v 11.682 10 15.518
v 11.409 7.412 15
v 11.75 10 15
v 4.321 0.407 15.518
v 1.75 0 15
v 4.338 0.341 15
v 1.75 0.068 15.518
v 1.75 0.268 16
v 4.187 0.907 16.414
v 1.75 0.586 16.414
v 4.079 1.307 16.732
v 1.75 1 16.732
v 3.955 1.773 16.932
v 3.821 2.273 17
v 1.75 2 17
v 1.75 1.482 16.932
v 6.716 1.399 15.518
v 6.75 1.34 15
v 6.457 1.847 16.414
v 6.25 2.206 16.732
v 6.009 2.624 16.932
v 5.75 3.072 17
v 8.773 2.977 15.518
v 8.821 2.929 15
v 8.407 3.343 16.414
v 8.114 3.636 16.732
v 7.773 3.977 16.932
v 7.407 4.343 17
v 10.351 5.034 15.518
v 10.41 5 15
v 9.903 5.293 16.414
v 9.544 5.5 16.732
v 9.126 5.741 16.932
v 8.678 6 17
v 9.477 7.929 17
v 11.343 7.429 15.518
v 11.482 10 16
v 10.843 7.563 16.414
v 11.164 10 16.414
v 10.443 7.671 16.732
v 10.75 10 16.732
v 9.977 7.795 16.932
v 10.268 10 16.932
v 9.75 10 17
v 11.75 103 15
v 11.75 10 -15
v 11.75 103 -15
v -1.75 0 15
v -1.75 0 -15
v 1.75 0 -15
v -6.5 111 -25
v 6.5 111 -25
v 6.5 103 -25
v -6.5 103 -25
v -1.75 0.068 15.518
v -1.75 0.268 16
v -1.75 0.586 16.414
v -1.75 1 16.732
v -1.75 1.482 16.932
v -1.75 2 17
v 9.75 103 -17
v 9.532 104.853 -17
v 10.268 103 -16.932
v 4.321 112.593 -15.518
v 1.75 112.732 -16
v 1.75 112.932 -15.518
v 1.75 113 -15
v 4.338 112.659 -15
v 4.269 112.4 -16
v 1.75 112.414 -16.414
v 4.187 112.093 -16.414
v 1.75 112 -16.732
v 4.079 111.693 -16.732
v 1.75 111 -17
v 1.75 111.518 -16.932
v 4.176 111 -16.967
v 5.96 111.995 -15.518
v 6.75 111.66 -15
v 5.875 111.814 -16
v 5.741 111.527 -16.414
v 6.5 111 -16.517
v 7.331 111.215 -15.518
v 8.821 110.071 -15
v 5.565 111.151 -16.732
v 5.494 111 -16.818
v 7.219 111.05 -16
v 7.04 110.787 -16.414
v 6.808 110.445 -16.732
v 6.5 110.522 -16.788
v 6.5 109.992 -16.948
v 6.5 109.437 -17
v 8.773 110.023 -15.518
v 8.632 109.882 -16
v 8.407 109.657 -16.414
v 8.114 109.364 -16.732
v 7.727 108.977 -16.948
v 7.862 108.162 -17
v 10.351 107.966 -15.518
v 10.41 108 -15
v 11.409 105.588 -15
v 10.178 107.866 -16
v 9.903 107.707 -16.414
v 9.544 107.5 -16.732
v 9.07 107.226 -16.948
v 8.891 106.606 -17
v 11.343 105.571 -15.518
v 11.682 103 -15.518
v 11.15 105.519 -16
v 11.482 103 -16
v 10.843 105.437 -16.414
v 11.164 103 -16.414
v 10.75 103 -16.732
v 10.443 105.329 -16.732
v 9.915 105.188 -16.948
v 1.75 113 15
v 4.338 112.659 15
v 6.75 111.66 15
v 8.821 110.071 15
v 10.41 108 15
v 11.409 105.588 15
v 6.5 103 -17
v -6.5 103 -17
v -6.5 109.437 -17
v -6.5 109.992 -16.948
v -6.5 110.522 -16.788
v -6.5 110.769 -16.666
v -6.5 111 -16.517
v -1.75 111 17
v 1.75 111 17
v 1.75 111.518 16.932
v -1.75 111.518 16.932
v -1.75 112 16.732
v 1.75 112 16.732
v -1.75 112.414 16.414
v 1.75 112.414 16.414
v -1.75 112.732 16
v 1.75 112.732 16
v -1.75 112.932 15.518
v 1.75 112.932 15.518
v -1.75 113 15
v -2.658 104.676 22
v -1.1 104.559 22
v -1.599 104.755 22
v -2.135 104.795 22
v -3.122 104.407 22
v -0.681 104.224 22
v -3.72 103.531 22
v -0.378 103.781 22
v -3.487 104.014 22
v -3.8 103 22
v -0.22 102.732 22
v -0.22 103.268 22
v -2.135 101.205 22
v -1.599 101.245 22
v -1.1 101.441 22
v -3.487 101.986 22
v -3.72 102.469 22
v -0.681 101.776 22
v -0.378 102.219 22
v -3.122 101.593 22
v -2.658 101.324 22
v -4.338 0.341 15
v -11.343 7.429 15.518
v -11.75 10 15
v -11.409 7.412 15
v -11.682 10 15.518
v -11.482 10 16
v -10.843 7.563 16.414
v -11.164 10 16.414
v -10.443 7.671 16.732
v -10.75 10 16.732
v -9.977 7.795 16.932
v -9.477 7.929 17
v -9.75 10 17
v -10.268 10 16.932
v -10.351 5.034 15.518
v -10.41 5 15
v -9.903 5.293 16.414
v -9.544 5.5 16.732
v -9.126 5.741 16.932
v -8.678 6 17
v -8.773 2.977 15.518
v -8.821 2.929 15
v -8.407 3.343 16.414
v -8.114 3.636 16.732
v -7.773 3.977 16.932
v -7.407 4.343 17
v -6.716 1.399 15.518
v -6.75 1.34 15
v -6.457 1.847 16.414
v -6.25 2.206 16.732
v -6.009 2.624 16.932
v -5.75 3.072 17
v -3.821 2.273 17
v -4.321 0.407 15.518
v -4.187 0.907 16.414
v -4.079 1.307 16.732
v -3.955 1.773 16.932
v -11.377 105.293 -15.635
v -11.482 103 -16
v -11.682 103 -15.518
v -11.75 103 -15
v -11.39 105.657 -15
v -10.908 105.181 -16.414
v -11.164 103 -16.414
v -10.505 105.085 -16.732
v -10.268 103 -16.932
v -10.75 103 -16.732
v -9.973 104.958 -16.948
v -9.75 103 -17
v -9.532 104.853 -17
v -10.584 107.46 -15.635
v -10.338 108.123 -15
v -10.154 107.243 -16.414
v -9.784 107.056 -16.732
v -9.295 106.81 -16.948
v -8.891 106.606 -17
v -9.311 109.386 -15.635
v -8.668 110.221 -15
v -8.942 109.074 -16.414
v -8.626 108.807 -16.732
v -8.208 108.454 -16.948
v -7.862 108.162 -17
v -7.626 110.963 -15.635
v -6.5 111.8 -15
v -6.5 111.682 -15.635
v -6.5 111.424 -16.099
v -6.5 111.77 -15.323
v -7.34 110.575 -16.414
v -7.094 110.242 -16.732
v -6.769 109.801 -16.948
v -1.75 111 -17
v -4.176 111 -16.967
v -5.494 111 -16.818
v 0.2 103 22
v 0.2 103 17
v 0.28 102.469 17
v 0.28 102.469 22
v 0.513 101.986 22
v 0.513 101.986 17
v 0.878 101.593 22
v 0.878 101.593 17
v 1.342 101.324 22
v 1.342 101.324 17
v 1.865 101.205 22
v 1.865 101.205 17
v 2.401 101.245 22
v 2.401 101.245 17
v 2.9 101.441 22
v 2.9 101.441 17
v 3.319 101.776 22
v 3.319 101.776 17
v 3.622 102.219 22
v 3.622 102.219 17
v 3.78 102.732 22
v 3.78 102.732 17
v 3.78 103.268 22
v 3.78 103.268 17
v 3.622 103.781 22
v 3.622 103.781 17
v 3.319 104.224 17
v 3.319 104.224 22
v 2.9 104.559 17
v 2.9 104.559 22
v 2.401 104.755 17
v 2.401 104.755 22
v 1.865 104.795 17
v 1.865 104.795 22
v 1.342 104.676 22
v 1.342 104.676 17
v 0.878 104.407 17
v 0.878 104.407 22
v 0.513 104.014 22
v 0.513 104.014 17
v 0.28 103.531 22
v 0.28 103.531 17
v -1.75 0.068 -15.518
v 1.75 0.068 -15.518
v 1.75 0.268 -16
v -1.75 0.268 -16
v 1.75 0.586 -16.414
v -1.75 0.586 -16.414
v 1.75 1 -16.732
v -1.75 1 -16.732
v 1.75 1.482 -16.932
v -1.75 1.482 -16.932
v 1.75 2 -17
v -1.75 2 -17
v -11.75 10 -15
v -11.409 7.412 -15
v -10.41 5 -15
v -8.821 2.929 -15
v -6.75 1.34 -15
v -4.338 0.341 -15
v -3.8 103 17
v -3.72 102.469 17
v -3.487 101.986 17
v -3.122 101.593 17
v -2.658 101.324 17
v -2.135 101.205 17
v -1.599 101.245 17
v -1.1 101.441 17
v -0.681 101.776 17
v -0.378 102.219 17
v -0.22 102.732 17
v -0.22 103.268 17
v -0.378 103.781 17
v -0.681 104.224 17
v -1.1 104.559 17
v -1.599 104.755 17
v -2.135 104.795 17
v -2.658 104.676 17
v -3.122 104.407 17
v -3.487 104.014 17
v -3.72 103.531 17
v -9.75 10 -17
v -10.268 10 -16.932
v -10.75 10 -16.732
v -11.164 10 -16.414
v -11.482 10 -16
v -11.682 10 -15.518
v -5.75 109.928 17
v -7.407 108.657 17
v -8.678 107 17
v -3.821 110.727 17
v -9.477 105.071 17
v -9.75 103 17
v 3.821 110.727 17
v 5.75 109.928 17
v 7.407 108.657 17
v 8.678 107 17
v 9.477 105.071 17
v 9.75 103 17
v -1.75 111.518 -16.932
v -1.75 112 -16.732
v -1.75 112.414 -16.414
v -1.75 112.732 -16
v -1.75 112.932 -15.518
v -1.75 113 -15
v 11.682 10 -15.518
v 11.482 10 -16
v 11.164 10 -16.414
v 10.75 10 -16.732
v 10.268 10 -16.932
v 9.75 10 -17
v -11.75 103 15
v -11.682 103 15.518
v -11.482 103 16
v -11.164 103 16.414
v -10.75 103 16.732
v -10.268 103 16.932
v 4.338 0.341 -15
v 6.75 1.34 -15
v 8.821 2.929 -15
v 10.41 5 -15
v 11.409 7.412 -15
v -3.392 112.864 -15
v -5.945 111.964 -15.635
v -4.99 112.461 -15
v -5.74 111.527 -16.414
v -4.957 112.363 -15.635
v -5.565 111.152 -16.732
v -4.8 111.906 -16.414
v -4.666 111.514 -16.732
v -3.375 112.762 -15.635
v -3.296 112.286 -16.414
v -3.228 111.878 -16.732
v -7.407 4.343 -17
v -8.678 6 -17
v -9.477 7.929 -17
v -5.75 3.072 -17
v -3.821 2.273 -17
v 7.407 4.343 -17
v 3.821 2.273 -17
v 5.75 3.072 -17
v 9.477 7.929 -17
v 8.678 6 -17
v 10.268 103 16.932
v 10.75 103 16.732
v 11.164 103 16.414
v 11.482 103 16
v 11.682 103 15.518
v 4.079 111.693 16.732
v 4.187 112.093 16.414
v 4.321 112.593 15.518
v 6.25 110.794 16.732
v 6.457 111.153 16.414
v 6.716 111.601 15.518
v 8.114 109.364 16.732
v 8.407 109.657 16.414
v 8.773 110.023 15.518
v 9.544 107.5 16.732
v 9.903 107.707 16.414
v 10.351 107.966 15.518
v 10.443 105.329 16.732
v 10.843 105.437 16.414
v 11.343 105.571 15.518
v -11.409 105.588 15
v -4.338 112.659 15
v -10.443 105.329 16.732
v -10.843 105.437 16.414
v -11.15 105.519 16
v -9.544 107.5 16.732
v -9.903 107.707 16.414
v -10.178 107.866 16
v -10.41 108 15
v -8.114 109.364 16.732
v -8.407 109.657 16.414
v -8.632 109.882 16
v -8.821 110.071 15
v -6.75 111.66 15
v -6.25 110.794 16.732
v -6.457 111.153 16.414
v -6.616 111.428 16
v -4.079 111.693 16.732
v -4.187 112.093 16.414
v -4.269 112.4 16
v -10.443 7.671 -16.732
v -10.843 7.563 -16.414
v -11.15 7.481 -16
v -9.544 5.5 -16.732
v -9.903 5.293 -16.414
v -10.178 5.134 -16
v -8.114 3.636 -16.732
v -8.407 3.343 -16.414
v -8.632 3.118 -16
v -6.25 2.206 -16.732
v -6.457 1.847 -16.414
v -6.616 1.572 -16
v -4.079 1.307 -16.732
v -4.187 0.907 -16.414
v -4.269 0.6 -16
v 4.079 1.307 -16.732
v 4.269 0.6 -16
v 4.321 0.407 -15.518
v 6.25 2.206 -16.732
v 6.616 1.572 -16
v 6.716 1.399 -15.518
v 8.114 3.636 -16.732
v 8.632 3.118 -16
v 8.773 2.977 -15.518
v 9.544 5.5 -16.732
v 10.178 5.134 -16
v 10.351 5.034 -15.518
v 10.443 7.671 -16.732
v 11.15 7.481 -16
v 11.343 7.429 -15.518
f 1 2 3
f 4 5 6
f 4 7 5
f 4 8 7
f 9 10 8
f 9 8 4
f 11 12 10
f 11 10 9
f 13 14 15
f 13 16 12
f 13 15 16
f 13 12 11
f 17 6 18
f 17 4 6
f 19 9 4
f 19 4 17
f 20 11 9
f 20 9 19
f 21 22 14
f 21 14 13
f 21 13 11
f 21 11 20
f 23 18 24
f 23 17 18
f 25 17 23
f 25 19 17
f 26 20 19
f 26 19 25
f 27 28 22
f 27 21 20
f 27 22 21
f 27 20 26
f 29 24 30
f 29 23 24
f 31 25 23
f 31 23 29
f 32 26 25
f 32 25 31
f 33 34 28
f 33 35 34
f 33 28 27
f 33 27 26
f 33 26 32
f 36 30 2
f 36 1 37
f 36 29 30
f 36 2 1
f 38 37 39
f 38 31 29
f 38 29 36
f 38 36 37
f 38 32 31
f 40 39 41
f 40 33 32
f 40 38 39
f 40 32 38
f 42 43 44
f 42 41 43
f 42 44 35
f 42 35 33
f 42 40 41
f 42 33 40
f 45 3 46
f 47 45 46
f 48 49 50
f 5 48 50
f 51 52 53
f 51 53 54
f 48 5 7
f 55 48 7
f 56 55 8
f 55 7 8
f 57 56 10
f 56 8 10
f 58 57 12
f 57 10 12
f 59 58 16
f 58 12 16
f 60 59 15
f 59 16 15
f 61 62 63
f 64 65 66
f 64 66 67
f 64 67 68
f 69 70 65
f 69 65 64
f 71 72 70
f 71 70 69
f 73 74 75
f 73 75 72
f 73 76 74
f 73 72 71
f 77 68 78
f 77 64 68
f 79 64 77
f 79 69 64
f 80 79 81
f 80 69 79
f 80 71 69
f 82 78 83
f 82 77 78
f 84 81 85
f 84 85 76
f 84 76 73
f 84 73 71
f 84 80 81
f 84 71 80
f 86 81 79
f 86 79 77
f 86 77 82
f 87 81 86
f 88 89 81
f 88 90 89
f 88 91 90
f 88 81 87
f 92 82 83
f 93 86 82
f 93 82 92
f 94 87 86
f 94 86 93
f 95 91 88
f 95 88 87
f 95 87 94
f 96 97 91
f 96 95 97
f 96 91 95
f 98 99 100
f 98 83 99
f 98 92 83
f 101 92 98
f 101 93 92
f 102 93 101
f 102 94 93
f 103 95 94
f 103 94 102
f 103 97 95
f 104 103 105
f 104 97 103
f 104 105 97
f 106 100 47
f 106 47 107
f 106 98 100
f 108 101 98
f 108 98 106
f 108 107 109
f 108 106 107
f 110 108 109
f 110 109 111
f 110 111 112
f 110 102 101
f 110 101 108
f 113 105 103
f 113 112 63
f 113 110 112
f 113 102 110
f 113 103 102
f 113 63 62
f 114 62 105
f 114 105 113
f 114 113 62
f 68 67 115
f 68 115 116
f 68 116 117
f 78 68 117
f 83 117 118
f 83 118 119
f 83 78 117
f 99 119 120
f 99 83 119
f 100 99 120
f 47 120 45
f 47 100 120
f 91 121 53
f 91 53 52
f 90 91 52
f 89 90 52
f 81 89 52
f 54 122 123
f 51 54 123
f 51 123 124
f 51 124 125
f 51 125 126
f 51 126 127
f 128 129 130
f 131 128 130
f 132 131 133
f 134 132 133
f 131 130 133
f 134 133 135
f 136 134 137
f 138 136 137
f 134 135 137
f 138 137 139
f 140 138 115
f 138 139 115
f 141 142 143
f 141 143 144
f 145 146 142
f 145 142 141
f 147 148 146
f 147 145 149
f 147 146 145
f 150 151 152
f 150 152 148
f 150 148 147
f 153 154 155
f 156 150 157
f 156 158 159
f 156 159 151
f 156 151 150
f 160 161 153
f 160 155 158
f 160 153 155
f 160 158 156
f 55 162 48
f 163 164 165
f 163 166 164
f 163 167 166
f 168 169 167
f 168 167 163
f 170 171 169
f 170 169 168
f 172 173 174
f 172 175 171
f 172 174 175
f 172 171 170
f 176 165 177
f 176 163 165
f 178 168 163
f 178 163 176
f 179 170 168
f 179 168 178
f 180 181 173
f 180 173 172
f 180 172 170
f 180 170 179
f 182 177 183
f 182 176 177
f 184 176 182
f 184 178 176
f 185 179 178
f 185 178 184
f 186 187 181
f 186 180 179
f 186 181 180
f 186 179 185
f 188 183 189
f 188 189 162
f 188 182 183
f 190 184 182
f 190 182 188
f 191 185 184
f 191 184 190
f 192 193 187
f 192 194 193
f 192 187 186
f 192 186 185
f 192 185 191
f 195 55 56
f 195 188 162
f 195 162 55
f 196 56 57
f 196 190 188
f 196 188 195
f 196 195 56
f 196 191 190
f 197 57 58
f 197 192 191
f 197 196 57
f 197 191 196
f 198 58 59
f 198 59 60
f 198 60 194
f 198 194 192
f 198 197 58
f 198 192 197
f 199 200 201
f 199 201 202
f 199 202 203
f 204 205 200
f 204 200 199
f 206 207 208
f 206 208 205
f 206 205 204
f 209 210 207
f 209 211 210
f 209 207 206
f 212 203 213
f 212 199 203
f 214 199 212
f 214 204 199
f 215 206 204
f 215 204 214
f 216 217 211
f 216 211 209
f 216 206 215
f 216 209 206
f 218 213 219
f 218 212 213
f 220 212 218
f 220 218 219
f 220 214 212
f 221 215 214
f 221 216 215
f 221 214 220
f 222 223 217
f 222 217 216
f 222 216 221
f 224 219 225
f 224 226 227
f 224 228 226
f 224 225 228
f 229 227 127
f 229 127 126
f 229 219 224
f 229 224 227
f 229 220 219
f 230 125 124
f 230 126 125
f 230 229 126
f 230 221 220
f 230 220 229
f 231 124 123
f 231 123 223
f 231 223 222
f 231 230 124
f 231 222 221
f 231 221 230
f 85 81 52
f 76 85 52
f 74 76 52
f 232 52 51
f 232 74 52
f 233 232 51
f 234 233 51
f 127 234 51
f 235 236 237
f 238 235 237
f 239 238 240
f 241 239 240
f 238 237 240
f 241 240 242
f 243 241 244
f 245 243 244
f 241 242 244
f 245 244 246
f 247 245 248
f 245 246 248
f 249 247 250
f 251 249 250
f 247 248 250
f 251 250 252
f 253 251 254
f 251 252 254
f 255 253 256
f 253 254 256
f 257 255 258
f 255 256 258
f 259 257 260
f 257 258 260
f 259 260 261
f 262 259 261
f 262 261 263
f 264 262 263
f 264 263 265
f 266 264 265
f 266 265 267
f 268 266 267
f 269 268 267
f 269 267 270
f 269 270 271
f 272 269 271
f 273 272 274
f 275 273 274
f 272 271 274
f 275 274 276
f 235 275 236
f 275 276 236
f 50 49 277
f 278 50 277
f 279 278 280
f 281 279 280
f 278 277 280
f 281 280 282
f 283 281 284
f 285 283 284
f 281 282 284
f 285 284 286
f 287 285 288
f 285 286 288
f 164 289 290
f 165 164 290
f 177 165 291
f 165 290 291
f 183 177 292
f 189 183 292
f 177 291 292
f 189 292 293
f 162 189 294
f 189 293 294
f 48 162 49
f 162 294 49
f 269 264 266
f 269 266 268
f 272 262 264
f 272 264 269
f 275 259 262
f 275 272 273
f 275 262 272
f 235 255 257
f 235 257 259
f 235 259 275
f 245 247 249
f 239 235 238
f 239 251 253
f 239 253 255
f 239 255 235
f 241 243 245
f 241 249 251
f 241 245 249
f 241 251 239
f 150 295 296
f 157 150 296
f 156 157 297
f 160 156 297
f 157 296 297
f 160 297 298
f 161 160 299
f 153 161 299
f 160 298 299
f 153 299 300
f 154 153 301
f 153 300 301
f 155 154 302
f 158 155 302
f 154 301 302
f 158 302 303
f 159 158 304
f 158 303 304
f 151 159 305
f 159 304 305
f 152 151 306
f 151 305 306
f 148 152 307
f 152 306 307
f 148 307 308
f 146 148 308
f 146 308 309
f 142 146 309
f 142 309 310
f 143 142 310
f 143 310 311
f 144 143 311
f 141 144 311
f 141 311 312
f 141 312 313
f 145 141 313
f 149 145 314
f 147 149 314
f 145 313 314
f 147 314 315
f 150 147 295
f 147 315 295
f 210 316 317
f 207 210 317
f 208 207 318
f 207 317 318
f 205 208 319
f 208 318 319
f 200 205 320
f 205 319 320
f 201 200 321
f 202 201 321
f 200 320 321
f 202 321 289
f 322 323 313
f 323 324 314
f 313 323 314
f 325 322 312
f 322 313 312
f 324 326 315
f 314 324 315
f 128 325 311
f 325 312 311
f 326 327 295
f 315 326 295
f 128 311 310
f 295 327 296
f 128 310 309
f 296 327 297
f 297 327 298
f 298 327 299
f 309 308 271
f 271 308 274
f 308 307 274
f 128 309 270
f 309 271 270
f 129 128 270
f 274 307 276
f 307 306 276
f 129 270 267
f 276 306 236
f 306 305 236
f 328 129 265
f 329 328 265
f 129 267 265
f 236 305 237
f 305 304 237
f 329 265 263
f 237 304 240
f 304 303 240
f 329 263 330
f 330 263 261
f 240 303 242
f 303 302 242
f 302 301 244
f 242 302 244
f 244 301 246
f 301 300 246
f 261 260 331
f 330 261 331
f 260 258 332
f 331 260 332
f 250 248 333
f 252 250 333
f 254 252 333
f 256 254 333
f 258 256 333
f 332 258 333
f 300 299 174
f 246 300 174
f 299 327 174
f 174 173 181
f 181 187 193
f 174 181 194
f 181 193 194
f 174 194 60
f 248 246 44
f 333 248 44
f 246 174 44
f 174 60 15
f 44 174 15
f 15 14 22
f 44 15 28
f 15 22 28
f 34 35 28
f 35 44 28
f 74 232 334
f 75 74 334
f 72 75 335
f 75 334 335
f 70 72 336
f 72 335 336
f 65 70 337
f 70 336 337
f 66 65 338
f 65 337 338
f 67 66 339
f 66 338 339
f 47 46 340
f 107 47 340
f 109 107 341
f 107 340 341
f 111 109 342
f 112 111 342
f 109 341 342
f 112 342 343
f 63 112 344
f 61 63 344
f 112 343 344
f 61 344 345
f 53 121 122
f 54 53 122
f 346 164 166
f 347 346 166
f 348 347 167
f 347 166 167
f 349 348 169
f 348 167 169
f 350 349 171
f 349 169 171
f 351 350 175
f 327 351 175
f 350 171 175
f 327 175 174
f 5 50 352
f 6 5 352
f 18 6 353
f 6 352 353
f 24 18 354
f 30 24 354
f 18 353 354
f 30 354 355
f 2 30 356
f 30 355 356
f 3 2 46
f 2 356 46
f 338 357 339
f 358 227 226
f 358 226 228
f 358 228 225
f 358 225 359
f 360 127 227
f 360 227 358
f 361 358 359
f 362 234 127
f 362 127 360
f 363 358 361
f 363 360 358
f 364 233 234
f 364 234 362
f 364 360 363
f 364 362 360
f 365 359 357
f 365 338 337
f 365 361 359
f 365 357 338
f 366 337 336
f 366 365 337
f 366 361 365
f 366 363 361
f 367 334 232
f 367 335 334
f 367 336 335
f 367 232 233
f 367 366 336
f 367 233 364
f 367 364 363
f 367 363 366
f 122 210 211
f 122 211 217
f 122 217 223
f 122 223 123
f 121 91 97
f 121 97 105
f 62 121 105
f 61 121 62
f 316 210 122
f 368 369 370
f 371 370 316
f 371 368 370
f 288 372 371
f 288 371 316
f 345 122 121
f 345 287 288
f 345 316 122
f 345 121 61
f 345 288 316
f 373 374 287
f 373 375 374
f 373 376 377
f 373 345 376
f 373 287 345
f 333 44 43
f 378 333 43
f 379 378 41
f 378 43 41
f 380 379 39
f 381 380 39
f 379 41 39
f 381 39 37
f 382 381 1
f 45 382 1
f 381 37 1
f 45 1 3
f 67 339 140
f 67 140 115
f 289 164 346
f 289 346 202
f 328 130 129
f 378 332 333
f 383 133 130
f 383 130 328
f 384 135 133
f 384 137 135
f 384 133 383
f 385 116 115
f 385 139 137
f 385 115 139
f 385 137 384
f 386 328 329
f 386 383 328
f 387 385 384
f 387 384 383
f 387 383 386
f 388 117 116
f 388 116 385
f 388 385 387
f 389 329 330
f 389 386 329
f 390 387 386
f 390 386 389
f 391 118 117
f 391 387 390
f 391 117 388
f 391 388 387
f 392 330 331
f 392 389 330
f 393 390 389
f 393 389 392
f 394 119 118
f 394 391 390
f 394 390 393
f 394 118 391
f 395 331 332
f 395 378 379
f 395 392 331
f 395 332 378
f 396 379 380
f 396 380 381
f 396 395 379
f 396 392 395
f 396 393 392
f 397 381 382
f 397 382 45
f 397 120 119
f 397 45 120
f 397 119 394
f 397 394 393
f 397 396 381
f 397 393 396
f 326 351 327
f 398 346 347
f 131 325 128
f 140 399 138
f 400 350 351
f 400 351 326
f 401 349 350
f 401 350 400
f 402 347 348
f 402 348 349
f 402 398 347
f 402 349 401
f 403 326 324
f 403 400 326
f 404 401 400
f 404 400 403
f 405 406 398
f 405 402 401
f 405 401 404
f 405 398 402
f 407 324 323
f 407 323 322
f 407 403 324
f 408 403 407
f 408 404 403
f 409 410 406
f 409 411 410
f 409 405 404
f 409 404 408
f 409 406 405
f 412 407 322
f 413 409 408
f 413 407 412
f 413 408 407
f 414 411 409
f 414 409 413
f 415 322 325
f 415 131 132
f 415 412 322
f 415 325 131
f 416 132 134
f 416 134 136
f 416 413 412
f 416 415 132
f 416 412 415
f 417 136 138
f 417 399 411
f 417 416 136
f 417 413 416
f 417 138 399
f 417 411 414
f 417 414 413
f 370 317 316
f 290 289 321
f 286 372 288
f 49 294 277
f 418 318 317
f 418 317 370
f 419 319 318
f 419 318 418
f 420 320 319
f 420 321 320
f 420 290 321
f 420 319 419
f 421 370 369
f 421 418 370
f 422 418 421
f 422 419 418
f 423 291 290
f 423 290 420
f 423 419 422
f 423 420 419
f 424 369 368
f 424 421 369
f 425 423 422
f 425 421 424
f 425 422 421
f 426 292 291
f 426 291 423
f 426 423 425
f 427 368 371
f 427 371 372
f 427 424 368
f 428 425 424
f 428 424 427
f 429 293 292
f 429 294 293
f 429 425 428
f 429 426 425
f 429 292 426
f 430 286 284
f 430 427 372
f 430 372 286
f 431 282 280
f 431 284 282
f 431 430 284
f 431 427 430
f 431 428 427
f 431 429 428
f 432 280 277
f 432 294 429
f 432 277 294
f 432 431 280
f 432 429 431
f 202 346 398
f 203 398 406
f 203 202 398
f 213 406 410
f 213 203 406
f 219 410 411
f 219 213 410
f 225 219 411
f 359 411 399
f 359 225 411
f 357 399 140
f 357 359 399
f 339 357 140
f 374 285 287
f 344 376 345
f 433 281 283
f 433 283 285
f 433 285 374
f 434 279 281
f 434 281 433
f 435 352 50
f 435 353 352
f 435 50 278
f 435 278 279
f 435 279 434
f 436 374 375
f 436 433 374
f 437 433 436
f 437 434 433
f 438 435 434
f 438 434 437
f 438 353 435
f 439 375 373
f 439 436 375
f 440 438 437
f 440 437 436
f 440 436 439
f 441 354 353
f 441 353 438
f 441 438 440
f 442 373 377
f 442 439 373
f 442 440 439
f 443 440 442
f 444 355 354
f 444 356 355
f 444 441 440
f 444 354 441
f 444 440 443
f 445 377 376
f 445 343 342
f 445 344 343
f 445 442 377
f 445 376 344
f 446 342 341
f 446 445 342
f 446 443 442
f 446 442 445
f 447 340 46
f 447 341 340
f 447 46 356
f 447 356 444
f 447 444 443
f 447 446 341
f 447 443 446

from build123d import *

# Parameters (mm, degrees)
SKETCH_1_W      = 23.5
SKETCH_1_H      = 34
EXTRUDE_1_DEPTH = 113
SKETCH_2_R      = 1.8
EXTRUDE_2_DEPTH = 5
SKETCH_3_W      = 13
SKETCH_3_H      = 8
EXTRUDE_3_DEPTH = 8
FILLET_1_R      = 10
FILLET_2_R      = 2


with BuildPart() as part:
    # ｽｹｯﾁ1 → ﾎﾞｽ - 押し出し1 (new body)
    with BuildSketch(Plane(origin=(0, 0, 0), x_dir=(1, 0, 0), z_dir=(0, 1, 0))):
        Rectangle(SKETCH_1_W, SKETCH_1_H)
    extrude(amount=EXTRUDE_1_DEPTH)

    # ｽｹｯﾁ2 → ﾎﾞｽ - 押し出し2 (add)
    with BuildSketch(Plane.XY.offset(17)):
        with Locations(Location((-2, 103, 0), (0, 0, 180))):
            Circle(SKETCH_2_R)
        with Locations(Location((2, 103, 0), (0, 0, 180))):
            Circle(SKETCH_2_R)
    extrude(amount=EXTRUDE_2_DEPTH)

    # ｽｹｯﾁ3 → ﾎﾞｽ - 押し出し3 (add)
    with BuildSketch(Plane(origin=(0, 0, -17), x_dir=(-1, 0, 0), z_dir=(0, 0, -1))):
        with Locations((0, 107)):
            Rectangle(SKETCH_3_W, SKETCH_3_H)
    extrude(amount=EXTRUDE_3_DEPTH)

    # ﾌｨﾚｯﾄ1
    fillet_1_edges = [part.edges().sort_by_distance(p)[0] for p in [
        (-11.75, 113, 0),
        (11.75, 113, 0),
        (-11.75, 0, 0),
        (11.75, 0, 0),
    ]]
    fillet(fillet_1_edges, radius=FILLET_1_R)

    # ﾌｨﾚｯﾄ2
    # the kernel refuses this fillet: 2 mm, written as the material it takes off along each edge
    with BuildSketch(Plane(origin=(11.75, 10, -17), x_dir=(-1, 0, 0), z_dir=(0, 1, 0)), Plane(origin=(11.75, 10, 17), x_dir=(0, 0, -1), z_dir=(0, 1, 0))) as fillet_2_piece_1:
        with BuildLine():
            CenterArc((FILLET_2_R, FILLET_2_R), FILLET_2_R, 180, 90)
            Line((0, FILLET_2_R), (0, 0))
            Line((0, 0), (FILLET_2_R, 0))
        make_face()
    extrude(amount=93, mode=Mode.SUBTRACT)
    with BuildSketch(Plane(origin=(-1.75, 0, -17), x_dir=(0, 1, 0), z_dir=(1, 0, 0)), Plane(origin=(1.75, 113, 17), x_dir=(0, 0, -1), z_dir=(-1, 0, 0))) as fillet_2_piece_2:
        with BuildLine():
            CenterArc((FILLET_2_R, FILLET_2_R), FILLET_2_R, 180, 90)
            Line((0, FILLET_2_R), (0, 0))
            Line((0, 0), (FILLET_2_R, 0))
        make_face()
    extrude(amount=3.5, mode=Mode.SUBTRACT)
    with BuildSketch(Plane(origin=(-11.75, 10, -17), x_dir=(1, 0, 0), z_dir=(0, 1, 0)), Plane(origin=(-11.75, 10, 17), x_dir=(0, 0, -1), z_dir=(0, 1, 0))) as fillet_2_piece_3:
        with BuildLine():
            CenterArc((FILLET_2_R, -FILLET_2_R), FILLET_2_R, 90, 90)
            Line((0, -FILLET_2_R), (0, 0))
            Line((0, 0), (FILLET_2_R, 0))
        make_face()
    extrude(amount=93, mode=Mode.SUBTRACT)
    with BuildSketch(Plane(origin=(-1.75, 113, -17), x_dir=(0, -1, 0), z_dir=(1, 0, 0)), Plane(origin=(1.75, 0, 17), x_dir=(0, 0, -1), z_dir=(-1, 0, 0))) as fillet_2_piece_4:
        with BuildLine():
            CenterArc((FILLET_2_R, -FILLET_2_R), FILLET_2_R, 90, 90)
            Line((0, -FILLET_2_R), (0, 0))
            Line((0, 0), (FILLET_2_R, 0))
        make_face()
    extrude(amount=3.5, mode=Mode.SUBTRACT)
    with BuildSketch(Plane(origin=(1.75, 103, -17), x_dir=(0, 1, 0), z_dir=(-1, 0, 0))) as fillet_2_piece_5_section:
        with BuildLine():
            CenterArc((10 - FILLET_2_R, -FILLET_2_R), FILLET_2_R, 0, 90)
            Line((10, -FILLET_2_R), (10, 0))
            Line((10, 0), (10 - FILLET_2_R, 0))
        make_face()
    fillet_2_piece_5 = revolve(axis=Axis((1.75, 103, -17), (0, 0, -1)), revolution_arc=90, mode=Mode.PRIVATE)
    fillet_2_piece_5 = split(fillet_2_piece_5, bisect_by=Plane(origin=(4.101759822, 111, -16.527412799), z_dir=(0, 1, 0)), keep=Keep.TOP, mode=Mode.PRIVATE)
    fillet_2_piece_5 = split(fillet_2_piece_5, bisect_by=Plane(origin=(6.5, 112.1945957, -16.527412799), z_dir=(-1, 0, 0)), keep=Keep.TOP, mode=Mode.PRIVATE)
    add(fillet_2_piece_5, mode=Mode.SUBTRACT)
    with BuildSketch(Plane(origin=(1.75, 103, -17), x_dir=(0, 1, 0), z_dir=(-1, 0, 0))) as fillet_2_piece_6_section:
        with BuildLine():
            CenterArc((10 - FILLET_2_R, -FILLET_2_R), FILLET_2_R, 0, 90)
            Line((10, -FILLET_2_R), (10, 0))
            Line((10, 0), (10 - FILLET_2_R, 0))
        make_face()
    fillet_2_piece_6 = revolve(axis=Axis((1.75, 103, -17), (0, 0, -1)), revolution_arc=90, mode=Mode.PRIVATE)
    fillet_2_piece_6 = split(fillet_2_piece_6, bisect_by=Plane(origin=(9.944543227, 111, -16.429177526), z_dir=(0, -1, 0)), keep=Keep.TOP, mode=Mode.PRIVATE)
    fillet_2_piece_6 = split(fillet_2_piece_6, bisect_by=Plane(origin=(6.5, 107.664638262, -16.429177526), z_dir=(1, 0, 0)), keep=Keep.TOP, mode=Mode.PRIVATE)
    add(fillet_2_piece_6, mode=Mode.SUBTRACT)
    with BuildSketch(Plane(origin=(1.75, 103, -17), x_dir=(0, 1, 0), z_dir=(-1, 0, 0))) as fillet_2_piece_7_section:
        with BuildLine():
            CenterArc((10 - FILLET_2_R, -FILLET_2_R), FILLET_2_R, 0, 90)
            Line((10, -FILLET_2_R), (10, 0))
            Line((10, 0), (10 - FILLET_2_R, 0))
        make_face()
    fillet_2_piece_7 = revolve(axis=Axis((1.75, 103, -17), (0, 0, -1)), revolution_arc=90, mode=Mode.PRIVATE)
    fillet_2_piece_7 = split(fillet_2_piece_7, bisect_by=Plane(origin=(6.999362203, 111, -16.337935444), z_dir=(0, 1, 0)), keep=Keep.TOP, mode=Mode.PRIVATE)
    fillet_2_piece_7 = split(fillet_2_piece_7, bisect_by=Plane(origin=(6.5, 111.322531281, -16.337935444), z_dir=(1, 0, 0)), keep=Keep.TOP, mode=Mode.PRIVATE)
    add(fillet_2_piece_7, mode=Mode.SUBTRACT)
    with BuildSketch(Plane(origin=(-1.75, 103, -17), x_dir=(-1, 0, 0), z_dir=(0, -1, 0))) as fillet_2_piece_8_section:
        with BuildLine():
            CenterArc((10 - FILLET_2_R, -FILLET_2_R), FILLET_2_R, 0, 90)
            Line((10, -FILLET_2_R), (10, 0))
            Line((10, 0), (10 - FILLET_2_R, 0))
        make_face()
    fillet_2_piece_8 = revolve(axis=Axis((-1.75, 103, -17), (0, 0, -1)), revolution_arc=90, mode=Mode.PRIVATE)
    fillet_2_piece_8 = split(fillet_2_piece_8, bisect_by=Plane(origin=(-6.5, 107.664638263, -16.429177529), z_dir=(-1, 0, 0)), keep=Keep.TOP, mode=Mode.PRIVATE)
    fillet_2_piece_8 = split(fillet_2_piece_8, bisect_by=Plane(origin=(-9.94454323, 111, -16.429177529), z_dir=(0, -1, 0)), keep=Keep.TOP, mode=Mode.PRIVATE)
    add(fillet_2_piece_8, mode=Mode.SUBTRACT)
    with BuildSketch(Plane(origin=(-1.75, 103, -17), x_dir=(-1, 0, 0), z_dir=(0, -1, 0))) as fillet_2_piece_9_section:
        with BuildLine():
            CenterArc((10 - FILLET_2_R, -FILLET_2_R), FILLET_2_R, 0, 90)
            Line((10, -FILLET_2_R), (10, 0))
            Line((10, 0), (10 - FILLET_2_R, 0))
        make_face()
    fillet_2_piece_9 = revolve(axis=Axis((-1.75, 103, -17), (0, 0, -1)), revolution_arc=90, mode=Mode.PRIVATE)
    fillet_2_piece_9 = split(fillet_2_piece_9, bisect_by=Plane(origin=(-6.5, 111.32253137, -16.337935534), z_dir=(-1, 0, 0)), keep=Keep.TOP, mode=Mode.PRIVATE)
    fillet_2_piece_9 = split(fillet_2_piece_9, bisect_by=Plane(origin=(-6.999362106, 111, -16.337935534), z_dir=(0, 1, 0)), keep=Keep.TOP, mode=Mode.PRIVATE)
    add(fillet_2_piece_9, mode=Mode.SUBTRACT)
    with BuildSketch(Plane(origin=(-1.75, 103, -17), x_dir=(-1, 0, 0), z_dir=(0, -1, 0))) as fillet_2_piece_10_section:
        with BuildLine():
            CenterArc((10 - FILLET_2_R, -FILLET_2_R), FILLET_2_R, 0, 90)
            Line((10, -FILLET_2_R), (10, 0))
            Line((10, 0), (10 - FILLET_2_R, 0))
        make_face()
    fillet_2_piece_10 = revolve(axis=Axis((-1.75, 103, -17), (0, 0, -1)), revolution_arc=90, mode=Mode.PRIVATE)
    fillet_2_piece_10 = split(fillet_2_piece_10, bisect_by=Plane(origin=(-6.5, 112.194595792, -16.527412821), z_dir=(1, 0, 0)), keep=Keep.TOP, mode=Mode.PRIVATE)
    fillet_2_piece_10 = split(fillet_2_piece_10, bisect_by=Plane(origin=(-4.101760011, 111, -16.527412821), z_dir=(0, 1, 0)), keep=Keep.TOP, mode=Mode.PRIVATE)
    add(fillet_2_piece_10, mode=Mode.SUBTRACT)
    with BuildSketch(Plane(origin=(-1.75, 10, -17), x_dir=(-1, 0, 0), z_dir=(0, 1, 0))) as fillet_2_piece_11:
        with BuildLine():
            CenterArc((10 - FILLET_2_R, FILLET_2_R), FILLET_2_R, 270, 90)
            Line((10, FILLET_2_R), (10, 0))
            Line((10, 0), (10 - FILLET_2_R, 0))
        make_face()
    revolve(axis=Axis((-1.75, 10, -17), (0, 0, 1)), revolution_arc=90, mode=Mode.SUBTRACT)
    with BuildSketch(Plane(origin=(1.75, 10, -17), x_dir=(0, -1, 0), z_dir=(-1, 0, 0))) as fillet_2_piece_12:
        with BuildLine():
            CenterArc((10 - FILLET_2_R, FILLET_2_R), FILLET_2_R, 270, 90)
            Line((10, FILLET_2_R), (10, 0))
            Line((10, 0), (10 - FILLET_2_R, 0))
        make_face()
    revolve(axis=Axis((1.75, 10, -17), (0, 0, 1)), revolution_arc=90, mode=Mode.SUBTRACT)
    with BuildSketch(Plane(origin=(1.75, 103, 17), x_dir=(0, 1, 0), z_dir=(-1, 0, 0))) as fillet_2_piece_13:
        with BuildLine():
            CenterArc((10 - FILLET_2_R, FILLET_2_R), FILLET_2_R, 270, 90)
            Line((10 - FILLET_2_R, 0), (10, 0))
            Line((10, 0), (10, FILLET_2_R))
        make_face()
    revolve(axis=Axis((1.75, 103, 17), (0, 0, -1)), revolution_arc=90, mode=Mode.SUBTRACT)
    with BuildSketch(Plane(origin=(-1.75, 103, 17), x_dir=(-1, 0, 0), z_dir=(0, -1, 0))) as fillet_2_piece_14:
        with BuildLine():
            CenterArc((10 - FILLET_2_R, FILLET_2_R), FILLET_2_R, 270, 90)
            Line((10 - FILLET_2_R, 0), (10, 0))
            Line((10, 0), (10, FILLET_2_R))
        make_face()
    revolve(axis=Axis((-1.75, 103, 17), (0, 0, -1)), revolution_arc=90, mode=Mode.SUBTRACT)
    with BuildSketch(Plane(origin=(-1.75, 10, 17), x_dir=(-1, 0, 0), z_dir=(0, 1, 0))) as fillet_2_piece_15:
        with BuildLine():
            CenterArc((10 - FILLET_2_R, -FILLET_2_R), FILLET_2_R, 0, 90)
            Line((10 - FILLET_2_R, 0), (10, 0))
            Line((10, 0), (10, -FILLET_2_R))
        make_face()
    revolve(axis=Axis((-1.75, 10, 17), (0, 0, 1)), revolution_arc=90, mode=Mode.SUBTRACT)
    with BuildSketch(Plane(origin=(1.75, 10, 17), x_dir=(0, -1, 0), z_dir=(-1, 0, 0))) as fillet_2_piece_16:
        with BuildLine():
            CenterArc((10 - FILLET_2_R, -FILLET_2_R), FILLET_2_R, 0, 90)
            Line((10 - FILLET_2_R, 0), (10, 0))
            Line((10, 0), (10, -FILLET_2_R))
        make_face()
    revolve(axis=Axis((1.75, 10, 17), (0, 0, 1)), revolution_arc=90, mode=Mode.SUBTRACT)


solid = part.part
